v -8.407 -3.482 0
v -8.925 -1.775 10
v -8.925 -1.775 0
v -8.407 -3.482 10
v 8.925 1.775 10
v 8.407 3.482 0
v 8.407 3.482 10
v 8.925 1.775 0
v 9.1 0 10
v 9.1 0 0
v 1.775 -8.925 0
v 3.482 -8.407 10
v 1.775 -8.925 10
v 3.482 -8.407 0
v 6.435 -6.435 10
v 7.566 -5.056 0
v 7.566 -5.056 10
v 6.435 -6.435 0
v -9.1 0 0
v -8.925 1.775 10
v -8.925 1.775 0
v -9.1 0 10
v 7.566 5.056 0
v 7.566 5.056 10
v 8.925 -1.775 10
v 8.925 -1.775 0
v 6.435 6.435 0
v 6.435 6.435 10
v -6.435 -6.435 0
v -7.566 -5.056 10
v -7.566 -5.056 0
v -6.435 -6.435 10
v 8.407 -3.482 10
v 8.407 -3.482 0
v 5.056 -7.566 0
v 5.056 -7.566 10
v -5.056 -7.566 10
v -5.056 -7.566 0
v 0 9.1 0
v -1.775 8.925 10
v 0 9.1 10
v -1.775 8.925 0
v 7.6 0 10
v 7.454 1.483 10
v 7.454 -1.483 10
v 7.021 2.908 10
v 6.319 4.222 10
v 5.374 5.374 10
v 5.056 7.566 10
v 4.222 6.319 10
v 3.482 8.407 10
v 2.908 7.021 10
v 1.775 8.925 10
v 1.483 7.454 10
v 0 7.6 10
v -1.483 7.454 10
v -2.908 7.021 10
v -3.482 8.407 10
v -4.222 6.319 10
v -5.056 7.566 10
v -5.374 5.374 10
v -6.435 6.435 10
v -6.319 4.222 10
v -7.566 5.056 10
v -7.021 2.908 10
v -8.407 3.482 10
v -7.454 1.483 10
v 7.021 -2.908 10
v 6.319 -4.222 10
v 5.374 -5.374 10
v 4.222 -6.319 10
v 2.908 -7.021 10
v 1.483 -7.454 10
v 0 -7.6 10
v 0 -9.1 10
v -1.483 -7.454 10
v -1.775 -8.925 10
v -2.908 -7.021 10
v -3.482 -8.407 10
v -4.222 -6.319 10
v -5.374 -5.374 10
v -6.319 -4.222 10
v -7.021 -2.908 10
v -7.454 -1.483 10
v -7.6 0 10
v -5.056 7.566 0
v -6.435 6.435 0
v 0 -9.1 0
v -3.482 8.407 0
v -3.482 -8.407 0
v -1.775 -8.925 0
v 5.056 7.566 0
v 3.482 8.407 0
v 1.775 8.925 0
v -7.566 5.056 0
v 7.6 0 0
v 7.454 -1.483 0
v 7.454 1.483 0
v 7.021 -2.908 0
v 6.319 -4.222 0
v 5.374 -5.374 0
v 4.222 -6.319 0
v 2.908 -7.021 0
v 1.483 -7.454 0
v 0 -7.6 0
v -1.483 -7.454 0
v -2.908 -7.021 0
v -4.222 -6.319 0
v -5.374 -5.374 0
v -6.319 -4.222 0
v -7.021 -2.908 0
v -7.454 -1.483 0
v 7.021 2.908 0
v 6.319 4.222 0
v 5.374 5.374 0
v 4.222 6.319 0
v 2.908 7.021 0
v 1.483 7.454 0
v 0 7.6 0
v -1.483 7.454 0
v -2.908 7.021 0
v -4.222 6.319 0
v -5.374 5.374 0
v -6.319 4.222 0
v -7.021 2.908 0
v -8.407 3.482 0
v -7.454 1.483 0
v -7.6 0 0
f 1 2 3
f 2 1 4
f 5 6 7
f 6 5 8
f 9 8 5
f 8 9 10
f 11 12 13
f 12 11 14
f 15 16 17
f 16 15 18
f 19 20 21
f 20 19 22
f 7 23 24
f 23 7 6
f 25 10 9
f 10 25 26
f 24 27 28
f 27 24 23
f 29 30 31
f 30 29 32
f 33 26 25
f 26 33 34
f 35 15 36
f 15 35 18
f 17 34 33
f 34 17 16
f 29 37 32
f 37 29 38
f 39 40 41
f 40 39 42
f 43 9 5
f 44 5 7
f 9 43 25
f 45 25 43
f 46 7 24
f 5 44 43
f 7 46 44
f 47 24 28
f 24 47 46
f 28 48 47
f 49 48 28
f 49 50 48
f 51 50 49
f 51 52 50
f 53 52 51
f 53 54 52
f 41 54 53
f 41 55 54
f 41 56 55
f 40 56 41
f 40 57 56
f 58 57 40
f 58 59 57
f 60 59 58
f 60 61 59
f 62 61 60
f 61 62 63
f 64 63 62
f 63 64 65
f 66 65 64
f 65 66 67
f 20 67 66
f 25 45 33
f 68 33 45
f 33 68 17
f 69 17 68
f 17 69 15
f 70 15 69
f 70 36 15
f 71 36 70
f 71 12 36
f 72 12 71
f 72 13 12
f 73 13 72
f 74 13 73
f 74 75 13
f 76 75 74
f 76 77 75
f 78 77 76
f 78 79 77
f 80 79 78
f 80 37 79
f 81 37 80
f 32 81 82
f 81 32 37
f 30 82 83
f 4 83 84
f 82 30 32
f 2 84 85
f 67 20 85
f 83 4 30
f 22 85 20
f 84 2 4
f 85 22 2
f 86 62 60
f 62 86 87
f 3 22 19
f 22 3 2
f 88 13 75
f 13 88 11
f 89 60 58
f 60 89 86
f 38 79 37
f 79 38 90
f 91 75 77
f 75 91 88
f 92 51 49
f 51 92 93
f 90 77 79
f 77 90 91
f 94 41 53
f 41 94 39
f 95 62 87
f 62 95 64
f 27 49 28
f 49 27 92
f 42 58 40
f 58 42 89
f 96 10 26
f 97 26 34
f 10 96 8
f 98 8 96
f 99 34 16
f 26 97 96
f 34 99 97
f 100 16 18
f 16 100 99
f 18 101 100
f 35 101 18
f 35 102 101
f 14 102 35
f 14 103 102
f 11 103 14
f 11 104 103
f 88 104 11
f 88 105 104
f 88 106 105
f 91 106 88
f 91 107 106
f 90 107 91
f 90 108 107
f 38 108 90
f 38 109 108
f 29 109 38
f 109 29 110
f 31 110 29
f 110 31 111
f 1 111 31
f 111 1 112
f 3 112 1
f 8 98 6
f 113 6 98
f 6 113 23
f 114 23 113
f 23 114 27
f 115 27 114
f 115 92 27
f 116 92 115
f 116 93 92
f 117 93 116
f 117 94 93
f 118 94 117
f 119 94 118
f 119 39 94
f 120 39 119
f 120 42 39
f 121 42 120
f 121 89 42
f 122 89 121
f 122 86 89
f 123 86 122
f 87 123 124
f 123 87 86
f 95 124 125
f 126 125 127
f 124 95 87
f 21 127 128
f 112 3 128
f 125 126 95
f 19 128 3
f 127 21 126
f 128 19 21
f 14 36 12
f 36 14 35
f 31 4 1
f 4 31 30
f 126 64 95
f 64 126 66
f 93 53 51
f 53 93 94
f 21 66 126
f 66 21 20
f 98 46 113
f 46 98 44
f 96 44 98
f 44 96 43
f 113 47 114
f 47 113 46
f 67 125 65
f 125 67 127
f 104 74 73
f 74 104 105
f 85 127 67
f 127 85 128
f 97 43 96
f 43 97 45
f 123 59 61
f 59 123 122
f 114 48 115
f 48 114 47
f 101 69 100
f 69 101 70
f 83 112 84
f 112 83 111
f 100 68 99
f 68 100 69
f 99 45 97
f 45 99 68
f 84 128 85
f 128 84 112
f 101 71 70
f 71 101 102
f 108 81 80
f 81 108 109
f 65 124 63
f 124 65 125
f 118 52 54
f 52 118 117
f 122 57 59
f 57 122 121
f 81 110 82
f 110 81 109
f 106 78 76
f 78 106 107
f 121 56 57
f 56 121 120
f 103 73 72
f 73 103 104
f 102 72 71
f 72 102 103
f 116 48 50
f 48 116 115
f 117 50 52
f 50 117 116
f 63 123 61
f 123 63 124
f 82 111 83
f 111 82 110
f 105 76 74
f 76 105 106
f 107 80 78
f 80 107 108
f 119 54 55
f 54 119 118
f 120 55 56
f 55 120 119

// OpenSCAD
$fn = 32;

// ----------------------------------------------------------------------
// Spacer sleeve: 18.2 / 15.2 x 10 mm
// ----------------------------------------------------------------------

// --- parameters (mm) ---
tube_d = 18.2;            // outside diameter
bore_d = 15.2;            // shaft bore
tube_l = 10;              // sleeve length
step_d = 17.9;            // reduced diameter
step_l = 4.4;             // length of the step

module sleeve() {
  cylinder(h = tube_l, d = tube_d);
  translate([0, 0, tube_l - step_l]) cylinder(h = step_l, d = step_d);
}

difference() {
  sleeve();
  translate([0, 0, -1]) cylinder(h = tube_l + 2, d = bore_d);
}
